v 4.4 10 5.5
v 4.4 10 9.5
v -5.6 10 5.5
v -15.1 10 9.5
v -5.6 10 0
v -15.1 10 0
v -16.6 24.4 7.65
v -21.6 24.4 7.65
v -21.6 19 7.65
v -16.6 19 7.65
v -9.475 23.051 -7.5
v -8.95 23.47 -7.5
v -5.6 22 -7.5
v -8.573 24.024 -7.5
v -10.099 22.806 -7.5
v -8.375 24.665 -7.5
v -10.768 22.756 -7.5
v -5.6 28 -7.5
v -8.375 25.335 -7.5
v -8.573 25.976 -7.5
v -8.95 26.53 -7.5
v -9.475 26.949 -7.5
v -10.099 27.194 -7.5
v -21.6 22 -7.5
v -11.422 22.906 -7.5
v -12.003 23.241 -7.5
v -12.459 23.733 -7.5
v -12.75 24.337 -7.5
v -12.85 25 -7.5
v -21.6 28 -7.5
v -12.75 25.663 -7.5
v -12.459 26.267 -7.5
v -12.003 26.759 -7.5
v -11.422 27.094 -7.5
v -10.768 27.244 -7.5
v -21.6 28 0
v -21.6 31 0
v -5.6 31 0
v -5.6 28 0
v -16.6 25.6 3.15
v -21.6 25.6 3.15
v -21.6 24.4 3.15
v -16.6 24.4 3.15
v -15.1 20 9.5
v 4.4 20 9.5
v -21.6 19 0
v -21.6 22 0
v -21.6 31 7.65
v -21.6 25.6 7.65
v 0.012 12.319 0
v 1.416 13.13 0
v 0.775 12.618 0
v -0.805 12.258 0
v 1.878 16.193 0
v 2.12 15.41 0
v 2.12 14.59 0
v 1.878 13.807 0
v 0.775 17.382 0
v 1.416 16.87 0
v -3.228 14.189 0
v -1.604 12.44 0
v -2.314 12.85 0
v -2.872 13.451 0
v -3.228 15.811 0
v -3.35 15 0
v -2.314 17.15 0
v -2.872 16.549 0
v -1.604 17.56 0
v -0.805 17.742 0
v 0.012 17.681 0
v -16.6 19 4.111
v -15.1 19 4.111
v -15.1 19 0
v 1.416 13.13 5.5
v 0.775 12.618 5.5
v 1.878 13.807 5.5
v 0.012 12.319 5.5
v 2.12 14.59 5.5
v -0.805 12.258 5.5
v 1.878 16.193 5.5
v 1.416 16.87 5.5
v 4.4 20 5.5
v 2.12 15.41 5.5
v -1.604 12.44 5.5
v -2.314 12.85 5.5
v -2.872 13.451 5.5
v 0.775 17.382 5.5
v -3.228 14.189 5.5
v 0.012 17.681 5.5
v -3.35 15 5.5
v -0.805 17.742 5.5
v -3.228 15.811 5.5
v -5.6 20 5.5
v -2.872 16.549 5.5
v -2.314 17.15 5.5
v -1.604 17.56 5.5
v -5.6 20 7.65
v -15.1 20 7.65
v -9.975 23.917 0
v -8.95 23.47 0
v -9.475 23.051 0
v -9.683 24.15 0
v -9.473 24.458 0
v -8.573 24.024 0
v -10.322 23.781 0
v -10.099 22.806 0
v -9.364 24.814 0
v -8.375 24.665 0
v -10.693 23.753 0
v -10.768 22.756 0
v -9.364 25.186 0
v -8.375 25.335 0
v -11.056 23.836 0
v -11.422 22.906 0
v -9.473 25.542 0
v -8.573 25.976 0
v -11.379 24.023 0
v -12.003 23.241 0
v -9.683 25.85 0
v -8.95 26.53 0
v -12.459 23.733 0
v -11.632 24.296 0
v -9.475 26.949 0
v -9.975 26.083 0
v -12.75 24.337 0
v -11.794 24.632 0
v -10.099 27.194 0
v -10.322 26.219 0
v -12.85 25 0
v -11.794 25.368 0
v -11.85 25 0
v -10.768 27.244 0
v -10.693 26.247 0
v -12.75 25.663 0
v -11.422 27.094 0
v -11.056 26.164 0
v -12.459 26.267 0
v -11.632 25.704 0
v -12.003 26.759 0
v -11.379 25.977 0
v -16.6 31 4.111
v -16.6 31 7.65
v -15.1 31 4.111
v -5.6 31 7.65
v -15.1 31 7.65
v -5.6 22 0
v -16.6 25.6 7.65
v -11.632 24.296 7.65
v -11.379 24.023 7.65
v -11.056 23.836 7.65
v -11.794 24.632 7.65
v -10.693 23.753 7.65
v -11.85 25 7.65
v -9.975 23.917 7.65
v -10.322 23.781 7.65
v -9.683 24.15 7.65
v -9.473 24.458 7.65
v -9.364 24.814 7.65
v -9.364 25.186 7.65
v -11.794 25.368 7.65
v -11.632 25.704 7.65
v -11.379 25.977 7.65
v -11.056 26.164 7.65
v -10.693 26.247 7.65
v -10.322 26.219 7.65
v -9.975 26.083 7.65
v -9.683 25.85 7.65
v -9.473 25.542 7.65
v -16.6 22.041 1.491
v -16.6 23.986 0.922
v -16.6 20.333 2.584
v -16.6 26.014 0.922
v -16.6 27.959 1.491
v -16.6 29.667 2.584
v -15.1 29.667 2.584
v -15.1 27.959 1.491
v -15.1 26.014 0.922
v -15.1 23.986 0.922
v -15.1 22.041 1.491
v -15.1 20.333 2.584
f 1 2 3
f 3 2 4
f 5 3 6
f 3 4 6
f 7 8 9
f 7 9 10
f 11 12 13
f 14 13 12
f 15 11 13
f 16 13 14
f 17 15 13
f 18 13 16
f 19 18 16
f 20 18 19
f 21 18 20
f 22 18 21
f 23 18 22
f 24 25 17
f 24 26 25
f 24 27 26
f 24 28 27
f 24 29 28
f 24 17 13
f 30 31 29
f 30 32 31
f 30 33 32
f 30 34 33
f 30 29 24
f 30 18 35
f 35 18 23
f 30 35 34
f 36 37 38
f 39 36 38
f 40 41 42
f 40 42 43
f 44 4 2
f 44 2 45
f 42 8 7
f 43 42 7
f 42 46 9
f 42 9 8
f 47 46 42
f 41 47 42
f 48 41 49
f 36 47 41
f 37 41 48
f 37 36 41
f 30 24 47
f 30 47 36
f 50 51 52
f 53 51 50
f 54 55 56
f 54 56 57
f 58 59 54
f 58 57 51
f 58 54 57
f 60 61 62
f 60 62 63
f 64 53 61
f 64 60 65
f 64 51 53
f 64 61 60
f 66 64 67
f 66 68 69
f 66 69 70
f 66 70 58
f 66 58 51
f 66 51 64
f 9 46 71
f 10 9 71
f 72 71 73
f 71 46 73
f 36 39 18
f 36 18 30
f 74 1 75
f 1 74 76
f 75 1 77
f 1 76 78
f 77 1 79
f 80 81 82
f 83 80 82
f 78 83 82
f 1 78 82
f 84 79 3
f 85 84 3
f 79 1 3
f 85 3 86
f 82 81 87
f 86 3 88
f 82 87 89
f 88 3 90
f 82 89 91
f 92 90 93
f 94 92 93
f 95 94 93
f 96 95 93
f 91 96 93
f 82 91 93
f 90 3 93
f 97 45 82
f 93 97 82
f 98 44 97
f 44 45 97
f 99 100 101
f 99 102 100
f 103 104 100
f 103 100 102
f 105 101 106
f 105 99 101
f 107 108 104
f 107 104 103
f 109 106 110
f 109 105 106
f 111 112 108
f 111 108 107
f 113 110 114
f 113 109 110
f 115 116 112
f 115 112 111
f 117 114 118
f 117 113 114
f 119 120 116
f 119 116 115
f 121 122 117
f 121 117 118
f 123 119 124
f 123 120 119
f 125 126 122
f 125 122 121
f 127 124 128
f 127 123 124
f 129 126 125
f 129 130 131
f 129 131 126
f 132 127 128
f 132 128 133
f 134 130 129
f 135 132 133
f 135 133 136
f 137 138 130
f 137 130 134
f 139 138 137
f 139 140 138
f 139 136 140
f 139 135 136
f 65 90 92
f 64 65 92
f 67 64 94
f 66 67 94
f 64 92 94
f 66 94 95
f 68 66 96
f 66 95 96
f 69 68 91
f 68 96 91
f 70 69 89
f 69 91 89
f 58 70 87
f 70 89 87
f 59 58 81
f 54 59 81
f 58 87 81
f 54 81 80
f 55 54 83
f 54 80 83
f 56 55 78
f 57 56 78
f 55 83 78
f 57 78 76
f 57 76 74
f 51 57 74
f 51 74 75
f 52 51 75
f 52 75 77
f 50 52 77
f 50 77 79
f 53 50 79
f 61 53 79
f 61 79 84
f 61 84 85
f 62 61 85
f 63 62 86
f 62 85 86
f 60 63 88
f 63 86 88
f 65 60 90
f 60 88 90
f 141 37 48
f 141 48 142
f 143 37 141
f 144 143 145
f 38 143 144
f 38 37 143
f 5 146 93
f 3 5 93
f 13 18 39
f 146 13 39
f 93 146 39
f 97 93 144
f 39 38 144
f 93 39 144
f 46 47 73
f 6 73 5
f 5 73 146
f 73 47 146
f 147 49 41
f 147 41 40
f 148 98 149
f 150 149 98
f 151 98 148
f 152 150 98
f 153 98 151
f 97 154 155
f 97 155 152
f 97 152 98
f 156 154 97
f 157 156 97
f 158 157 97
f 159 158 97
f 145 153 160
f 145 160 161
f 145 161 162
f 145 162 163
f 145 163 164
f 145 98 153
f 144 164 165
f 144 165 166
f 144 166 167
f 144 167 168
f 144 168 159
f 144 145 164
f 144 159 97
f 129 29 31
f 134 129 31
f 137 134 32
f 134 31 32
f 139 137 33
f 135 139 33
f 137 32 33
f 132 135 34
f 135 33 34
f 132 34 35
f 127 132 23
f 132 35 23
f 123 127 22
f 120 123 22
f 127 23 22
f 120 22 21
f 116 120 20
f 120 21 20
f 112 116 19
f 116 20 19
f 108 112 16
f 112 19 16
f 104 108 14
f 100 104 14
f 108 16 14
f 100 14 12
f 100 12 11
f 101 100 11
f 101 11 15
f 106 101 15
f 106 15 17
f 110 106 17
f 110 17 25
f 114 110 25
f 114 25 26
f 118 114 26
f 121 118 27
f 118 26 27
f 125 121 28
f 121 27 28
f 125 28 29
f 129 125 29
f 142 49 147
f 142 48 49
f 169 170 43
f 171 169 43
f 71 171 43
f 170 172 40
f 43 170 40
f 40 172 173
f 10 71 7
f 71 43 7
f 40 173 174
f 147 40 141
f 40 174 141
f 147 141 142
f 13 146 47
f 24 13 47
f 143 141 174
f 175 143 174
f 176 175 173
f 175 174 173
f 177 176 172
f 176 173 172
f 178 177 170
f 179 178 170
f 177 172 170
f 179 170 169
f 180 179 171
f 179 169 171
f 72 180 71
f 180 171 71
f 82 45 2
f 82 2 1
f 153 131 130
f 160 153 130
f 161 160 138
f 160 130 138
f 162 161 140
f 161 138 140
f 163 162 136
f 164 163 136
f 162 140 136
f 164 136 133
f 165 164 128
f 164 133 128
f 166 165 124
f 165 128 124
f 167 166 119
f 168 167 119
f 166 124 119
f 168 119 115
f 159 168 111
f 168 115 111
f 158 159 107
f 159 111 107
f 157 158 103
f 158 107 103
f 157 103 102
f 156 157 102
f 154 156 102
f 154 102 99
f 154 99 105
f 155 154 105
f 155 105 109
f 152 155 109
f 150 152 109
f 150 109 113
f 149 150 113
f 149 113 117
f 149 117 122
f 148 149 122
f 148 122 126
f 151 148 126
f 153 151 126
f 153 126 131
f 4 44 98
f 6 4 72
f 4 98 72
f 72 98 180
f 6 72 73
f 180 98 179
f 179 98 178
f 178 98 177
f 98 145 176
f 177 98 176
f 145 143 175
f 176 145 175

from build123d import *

# Parameters (mm, degrees)
SKETCH_1_W          = 16
SKETCH_1_H          = 12
EXTRUDE_1_DEPTH     = 7.65
SKETCH_2_W          = 5
SKETCH_2_H          = 1.2
CUT_EXTRUDE_1_DEPTH = 4.5
SKETCH_3_R          = 7.15
CUT_EXTRUDE_2_DEPTH = 1.5
SKETCH_4_W          = 16
SKETCH_4_H          = 6
EXTRUDE_2_DEPTH     = 7.5
SKETCH_5_R          = 2.25
CUT_EXTRUDE_3_DEPTH = 7.5
SKETCH_6_R          = 1.25
CUT_EXTRUDE_4_DEPTH = 8.65
SKETCH_7_W          = 9.5
SKETCH_7_H          = 7.65
EXTRUDE_3_DEPTH     = 9
EXTRUDE_START       = -9.5
SKETCH_8_W          = 4
SKETCH_8_H          = 10
EXTRUDE_4_DEPTH     = 19.5
SKETCH_9_R          = 2.75
EXTRUDE_5_DEPTH     = 5.5


with BuildPart() as part:
    # Эскиз1 → Бобышка-Вытянуть1 (new body)
    with BuildSketch(Plane.XY):
        with Locations((-13.599693696, 25)):
            Rectangle(SKETCH_1_W, SKETCH_1_H)
    extrude(amount=EXTRUDE_1_DEPTH)

    # Эскиз2 → Вырез-Вытянуть1 (cut)
    with BuildSketch(Plane.XY.offset(7.65)):
        with Locations((-19.099693696, 25)):
            Rectangle(SKETCH_2_W, SKETCH_2_H)
    extrude(amount=-CUT_EXTRUDE_1_DEPTH, mode=Mode.SUBTRACT)

    # Эскиз3 → Вырез-Вытянуть2 (cut)
    with BuildSketch(Plane.ZY.offset(16.599693696)):
        with Locations((8, 25)):
            Circle(SKETCH_3_R)
    extrude(amount=-CUT_EXTRUDE_2_DEPTH, mode=Mode.SUBTRACT)

    # Эскиз4 → Бобышка-Вытянуть2 (add)
    with BuildSketch(Plane(origin=(0, 0, 0), x_dir=(-1, 0, 0), z_dir=(0, 0, -1))):
        with Locations((13.599693696, 25)):
            Rectangle(SKETCH_4_W, SKETCH_4_H)
    extrude(amount=EXTRUDE_2_DEPTH)

    # Эскиз5 → Вырез-Вытянуть3 (cut)
    with BuildSketch(Plane(origin=(0, 0, -7.5), x_dir=(-1, 0, 0), z_dir=(0, 0, -1))):
        with Locations((10.599693696, 25)):
            Circle(SKETCH_5_R)
    extrude(amount=-CUT_EXTRUDE_3_DEPTH, mode=Mode.SUBTRACT)

    # Эскиз6 → Вырез-Вытянуть4 (cut, through all)
    with BuildSketch(Plane(origin=(0, 0, 0), x_dir=(-1, 0, 0), z_dir=(0, 0, -1))):
        with Locations((10.599693696, 25)):
            Circle(SKETCH_6_R)
    extrude(amount=-CUT_EXTRUDE_4_DEPTH, mode=Mode.SUBTRACT)

    # Эскиз7 → Бобышка-Вытянуть3 (add)
    with BuildSketch(Plane.XZ.offset(-19)):
        with Locations((-10.349693696, 3.825)):
            Rectangle(SKETCH_7_W, SKETCH_7_H)
    extrude(amount=EXTRUDE_3_DEPTH)

    # Эскиз8 → Бобышка-Вытянуть4 (add)
    with BuildSketch(Plane(origin=(-5.599693696, 0, 0), x_dir=(0, 0, -1), z_dir=(1, 0, 0)).offset(EXTRUDE_START)):
        with Locations((-7.5, 15)):
            Rectangle(SKETCH_8_W, SKETCH_8_H)
    extrude(amount=EXTRUDE_4_DEPTH)

    # Эскиз9 → Бобышка-Вытянуть5 (add)
    with BuildSketch(Plane(origin=(0, 0, 5.5), x_dir=(-1, 0, 0), z_dir=(0, 0, -1))):
        with Locations((0.599693696, 15)):
            Circle(SKETCH_9_R)
    extrude(amount=EXTRUDE_5_DEPTH)


solid = part.part
